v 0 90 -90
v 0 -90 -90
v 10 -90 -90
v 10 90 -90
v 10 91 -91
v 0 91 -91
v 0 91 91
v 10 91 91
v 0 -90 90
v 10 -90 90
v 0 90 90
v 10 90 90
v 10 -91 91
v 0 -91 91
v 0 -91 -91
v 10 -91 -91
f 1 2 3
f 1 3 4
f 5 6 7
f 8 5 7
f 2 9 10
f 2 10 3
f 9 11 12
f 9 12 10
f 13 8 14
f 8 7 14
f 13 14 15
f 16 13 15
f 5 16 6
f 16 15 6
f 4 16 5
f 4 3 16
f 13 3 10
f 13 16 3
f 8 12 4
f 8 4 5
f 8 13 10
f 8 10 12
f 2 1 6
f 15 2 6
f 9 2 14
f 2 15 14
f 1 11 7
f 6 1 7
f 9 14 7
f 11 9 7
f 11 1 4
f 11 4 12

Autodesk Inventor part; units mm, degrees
ref_plane "YZ Plane" through (0, 0, 0) normal (1, 0, 0) x (0, 1, 0)
ref_plane "XZ Plane" through (0, 0, 0) normal (0, 1, 0) x (-1, 0, 0)
ref_plane "XY Plane" through (0, 0, 0) normal (0, 0, 1) x (1, 0, 0)
sketch "Sketch1" plane through (0, 0, 0) normal (1, 0, 0) x (0, 1, 0)
  line L0 (90, 90) -> (-90, 90)
  line L1 (-90, 90) -> (-90, -90)
  line L2 (-90, -90) -> (90, -90)
  line L3 (90, -90) -> (90, 90)
  line L4 (91, 91) -> (-91, 91)
  line L5 (-91, 91) -> (-91, -91)
  line L6 (-91, -91) -> (91, -91)
  line L7 (91, -91) -> (91, 91)
  point P0 (0, 0)
  dimension "d0" = 180
  dimension "d1" = 180
  dimension "d2" = 90
  dimension "d3" = 90
  dimension "d4" = 1
  dimension "d5" = 1
  dimension "d6" = 1
  dimension "d7" = 1
extrude "Extrusion1" add sketch "Sketch1" along normal blind 10
properties part number "frame"
